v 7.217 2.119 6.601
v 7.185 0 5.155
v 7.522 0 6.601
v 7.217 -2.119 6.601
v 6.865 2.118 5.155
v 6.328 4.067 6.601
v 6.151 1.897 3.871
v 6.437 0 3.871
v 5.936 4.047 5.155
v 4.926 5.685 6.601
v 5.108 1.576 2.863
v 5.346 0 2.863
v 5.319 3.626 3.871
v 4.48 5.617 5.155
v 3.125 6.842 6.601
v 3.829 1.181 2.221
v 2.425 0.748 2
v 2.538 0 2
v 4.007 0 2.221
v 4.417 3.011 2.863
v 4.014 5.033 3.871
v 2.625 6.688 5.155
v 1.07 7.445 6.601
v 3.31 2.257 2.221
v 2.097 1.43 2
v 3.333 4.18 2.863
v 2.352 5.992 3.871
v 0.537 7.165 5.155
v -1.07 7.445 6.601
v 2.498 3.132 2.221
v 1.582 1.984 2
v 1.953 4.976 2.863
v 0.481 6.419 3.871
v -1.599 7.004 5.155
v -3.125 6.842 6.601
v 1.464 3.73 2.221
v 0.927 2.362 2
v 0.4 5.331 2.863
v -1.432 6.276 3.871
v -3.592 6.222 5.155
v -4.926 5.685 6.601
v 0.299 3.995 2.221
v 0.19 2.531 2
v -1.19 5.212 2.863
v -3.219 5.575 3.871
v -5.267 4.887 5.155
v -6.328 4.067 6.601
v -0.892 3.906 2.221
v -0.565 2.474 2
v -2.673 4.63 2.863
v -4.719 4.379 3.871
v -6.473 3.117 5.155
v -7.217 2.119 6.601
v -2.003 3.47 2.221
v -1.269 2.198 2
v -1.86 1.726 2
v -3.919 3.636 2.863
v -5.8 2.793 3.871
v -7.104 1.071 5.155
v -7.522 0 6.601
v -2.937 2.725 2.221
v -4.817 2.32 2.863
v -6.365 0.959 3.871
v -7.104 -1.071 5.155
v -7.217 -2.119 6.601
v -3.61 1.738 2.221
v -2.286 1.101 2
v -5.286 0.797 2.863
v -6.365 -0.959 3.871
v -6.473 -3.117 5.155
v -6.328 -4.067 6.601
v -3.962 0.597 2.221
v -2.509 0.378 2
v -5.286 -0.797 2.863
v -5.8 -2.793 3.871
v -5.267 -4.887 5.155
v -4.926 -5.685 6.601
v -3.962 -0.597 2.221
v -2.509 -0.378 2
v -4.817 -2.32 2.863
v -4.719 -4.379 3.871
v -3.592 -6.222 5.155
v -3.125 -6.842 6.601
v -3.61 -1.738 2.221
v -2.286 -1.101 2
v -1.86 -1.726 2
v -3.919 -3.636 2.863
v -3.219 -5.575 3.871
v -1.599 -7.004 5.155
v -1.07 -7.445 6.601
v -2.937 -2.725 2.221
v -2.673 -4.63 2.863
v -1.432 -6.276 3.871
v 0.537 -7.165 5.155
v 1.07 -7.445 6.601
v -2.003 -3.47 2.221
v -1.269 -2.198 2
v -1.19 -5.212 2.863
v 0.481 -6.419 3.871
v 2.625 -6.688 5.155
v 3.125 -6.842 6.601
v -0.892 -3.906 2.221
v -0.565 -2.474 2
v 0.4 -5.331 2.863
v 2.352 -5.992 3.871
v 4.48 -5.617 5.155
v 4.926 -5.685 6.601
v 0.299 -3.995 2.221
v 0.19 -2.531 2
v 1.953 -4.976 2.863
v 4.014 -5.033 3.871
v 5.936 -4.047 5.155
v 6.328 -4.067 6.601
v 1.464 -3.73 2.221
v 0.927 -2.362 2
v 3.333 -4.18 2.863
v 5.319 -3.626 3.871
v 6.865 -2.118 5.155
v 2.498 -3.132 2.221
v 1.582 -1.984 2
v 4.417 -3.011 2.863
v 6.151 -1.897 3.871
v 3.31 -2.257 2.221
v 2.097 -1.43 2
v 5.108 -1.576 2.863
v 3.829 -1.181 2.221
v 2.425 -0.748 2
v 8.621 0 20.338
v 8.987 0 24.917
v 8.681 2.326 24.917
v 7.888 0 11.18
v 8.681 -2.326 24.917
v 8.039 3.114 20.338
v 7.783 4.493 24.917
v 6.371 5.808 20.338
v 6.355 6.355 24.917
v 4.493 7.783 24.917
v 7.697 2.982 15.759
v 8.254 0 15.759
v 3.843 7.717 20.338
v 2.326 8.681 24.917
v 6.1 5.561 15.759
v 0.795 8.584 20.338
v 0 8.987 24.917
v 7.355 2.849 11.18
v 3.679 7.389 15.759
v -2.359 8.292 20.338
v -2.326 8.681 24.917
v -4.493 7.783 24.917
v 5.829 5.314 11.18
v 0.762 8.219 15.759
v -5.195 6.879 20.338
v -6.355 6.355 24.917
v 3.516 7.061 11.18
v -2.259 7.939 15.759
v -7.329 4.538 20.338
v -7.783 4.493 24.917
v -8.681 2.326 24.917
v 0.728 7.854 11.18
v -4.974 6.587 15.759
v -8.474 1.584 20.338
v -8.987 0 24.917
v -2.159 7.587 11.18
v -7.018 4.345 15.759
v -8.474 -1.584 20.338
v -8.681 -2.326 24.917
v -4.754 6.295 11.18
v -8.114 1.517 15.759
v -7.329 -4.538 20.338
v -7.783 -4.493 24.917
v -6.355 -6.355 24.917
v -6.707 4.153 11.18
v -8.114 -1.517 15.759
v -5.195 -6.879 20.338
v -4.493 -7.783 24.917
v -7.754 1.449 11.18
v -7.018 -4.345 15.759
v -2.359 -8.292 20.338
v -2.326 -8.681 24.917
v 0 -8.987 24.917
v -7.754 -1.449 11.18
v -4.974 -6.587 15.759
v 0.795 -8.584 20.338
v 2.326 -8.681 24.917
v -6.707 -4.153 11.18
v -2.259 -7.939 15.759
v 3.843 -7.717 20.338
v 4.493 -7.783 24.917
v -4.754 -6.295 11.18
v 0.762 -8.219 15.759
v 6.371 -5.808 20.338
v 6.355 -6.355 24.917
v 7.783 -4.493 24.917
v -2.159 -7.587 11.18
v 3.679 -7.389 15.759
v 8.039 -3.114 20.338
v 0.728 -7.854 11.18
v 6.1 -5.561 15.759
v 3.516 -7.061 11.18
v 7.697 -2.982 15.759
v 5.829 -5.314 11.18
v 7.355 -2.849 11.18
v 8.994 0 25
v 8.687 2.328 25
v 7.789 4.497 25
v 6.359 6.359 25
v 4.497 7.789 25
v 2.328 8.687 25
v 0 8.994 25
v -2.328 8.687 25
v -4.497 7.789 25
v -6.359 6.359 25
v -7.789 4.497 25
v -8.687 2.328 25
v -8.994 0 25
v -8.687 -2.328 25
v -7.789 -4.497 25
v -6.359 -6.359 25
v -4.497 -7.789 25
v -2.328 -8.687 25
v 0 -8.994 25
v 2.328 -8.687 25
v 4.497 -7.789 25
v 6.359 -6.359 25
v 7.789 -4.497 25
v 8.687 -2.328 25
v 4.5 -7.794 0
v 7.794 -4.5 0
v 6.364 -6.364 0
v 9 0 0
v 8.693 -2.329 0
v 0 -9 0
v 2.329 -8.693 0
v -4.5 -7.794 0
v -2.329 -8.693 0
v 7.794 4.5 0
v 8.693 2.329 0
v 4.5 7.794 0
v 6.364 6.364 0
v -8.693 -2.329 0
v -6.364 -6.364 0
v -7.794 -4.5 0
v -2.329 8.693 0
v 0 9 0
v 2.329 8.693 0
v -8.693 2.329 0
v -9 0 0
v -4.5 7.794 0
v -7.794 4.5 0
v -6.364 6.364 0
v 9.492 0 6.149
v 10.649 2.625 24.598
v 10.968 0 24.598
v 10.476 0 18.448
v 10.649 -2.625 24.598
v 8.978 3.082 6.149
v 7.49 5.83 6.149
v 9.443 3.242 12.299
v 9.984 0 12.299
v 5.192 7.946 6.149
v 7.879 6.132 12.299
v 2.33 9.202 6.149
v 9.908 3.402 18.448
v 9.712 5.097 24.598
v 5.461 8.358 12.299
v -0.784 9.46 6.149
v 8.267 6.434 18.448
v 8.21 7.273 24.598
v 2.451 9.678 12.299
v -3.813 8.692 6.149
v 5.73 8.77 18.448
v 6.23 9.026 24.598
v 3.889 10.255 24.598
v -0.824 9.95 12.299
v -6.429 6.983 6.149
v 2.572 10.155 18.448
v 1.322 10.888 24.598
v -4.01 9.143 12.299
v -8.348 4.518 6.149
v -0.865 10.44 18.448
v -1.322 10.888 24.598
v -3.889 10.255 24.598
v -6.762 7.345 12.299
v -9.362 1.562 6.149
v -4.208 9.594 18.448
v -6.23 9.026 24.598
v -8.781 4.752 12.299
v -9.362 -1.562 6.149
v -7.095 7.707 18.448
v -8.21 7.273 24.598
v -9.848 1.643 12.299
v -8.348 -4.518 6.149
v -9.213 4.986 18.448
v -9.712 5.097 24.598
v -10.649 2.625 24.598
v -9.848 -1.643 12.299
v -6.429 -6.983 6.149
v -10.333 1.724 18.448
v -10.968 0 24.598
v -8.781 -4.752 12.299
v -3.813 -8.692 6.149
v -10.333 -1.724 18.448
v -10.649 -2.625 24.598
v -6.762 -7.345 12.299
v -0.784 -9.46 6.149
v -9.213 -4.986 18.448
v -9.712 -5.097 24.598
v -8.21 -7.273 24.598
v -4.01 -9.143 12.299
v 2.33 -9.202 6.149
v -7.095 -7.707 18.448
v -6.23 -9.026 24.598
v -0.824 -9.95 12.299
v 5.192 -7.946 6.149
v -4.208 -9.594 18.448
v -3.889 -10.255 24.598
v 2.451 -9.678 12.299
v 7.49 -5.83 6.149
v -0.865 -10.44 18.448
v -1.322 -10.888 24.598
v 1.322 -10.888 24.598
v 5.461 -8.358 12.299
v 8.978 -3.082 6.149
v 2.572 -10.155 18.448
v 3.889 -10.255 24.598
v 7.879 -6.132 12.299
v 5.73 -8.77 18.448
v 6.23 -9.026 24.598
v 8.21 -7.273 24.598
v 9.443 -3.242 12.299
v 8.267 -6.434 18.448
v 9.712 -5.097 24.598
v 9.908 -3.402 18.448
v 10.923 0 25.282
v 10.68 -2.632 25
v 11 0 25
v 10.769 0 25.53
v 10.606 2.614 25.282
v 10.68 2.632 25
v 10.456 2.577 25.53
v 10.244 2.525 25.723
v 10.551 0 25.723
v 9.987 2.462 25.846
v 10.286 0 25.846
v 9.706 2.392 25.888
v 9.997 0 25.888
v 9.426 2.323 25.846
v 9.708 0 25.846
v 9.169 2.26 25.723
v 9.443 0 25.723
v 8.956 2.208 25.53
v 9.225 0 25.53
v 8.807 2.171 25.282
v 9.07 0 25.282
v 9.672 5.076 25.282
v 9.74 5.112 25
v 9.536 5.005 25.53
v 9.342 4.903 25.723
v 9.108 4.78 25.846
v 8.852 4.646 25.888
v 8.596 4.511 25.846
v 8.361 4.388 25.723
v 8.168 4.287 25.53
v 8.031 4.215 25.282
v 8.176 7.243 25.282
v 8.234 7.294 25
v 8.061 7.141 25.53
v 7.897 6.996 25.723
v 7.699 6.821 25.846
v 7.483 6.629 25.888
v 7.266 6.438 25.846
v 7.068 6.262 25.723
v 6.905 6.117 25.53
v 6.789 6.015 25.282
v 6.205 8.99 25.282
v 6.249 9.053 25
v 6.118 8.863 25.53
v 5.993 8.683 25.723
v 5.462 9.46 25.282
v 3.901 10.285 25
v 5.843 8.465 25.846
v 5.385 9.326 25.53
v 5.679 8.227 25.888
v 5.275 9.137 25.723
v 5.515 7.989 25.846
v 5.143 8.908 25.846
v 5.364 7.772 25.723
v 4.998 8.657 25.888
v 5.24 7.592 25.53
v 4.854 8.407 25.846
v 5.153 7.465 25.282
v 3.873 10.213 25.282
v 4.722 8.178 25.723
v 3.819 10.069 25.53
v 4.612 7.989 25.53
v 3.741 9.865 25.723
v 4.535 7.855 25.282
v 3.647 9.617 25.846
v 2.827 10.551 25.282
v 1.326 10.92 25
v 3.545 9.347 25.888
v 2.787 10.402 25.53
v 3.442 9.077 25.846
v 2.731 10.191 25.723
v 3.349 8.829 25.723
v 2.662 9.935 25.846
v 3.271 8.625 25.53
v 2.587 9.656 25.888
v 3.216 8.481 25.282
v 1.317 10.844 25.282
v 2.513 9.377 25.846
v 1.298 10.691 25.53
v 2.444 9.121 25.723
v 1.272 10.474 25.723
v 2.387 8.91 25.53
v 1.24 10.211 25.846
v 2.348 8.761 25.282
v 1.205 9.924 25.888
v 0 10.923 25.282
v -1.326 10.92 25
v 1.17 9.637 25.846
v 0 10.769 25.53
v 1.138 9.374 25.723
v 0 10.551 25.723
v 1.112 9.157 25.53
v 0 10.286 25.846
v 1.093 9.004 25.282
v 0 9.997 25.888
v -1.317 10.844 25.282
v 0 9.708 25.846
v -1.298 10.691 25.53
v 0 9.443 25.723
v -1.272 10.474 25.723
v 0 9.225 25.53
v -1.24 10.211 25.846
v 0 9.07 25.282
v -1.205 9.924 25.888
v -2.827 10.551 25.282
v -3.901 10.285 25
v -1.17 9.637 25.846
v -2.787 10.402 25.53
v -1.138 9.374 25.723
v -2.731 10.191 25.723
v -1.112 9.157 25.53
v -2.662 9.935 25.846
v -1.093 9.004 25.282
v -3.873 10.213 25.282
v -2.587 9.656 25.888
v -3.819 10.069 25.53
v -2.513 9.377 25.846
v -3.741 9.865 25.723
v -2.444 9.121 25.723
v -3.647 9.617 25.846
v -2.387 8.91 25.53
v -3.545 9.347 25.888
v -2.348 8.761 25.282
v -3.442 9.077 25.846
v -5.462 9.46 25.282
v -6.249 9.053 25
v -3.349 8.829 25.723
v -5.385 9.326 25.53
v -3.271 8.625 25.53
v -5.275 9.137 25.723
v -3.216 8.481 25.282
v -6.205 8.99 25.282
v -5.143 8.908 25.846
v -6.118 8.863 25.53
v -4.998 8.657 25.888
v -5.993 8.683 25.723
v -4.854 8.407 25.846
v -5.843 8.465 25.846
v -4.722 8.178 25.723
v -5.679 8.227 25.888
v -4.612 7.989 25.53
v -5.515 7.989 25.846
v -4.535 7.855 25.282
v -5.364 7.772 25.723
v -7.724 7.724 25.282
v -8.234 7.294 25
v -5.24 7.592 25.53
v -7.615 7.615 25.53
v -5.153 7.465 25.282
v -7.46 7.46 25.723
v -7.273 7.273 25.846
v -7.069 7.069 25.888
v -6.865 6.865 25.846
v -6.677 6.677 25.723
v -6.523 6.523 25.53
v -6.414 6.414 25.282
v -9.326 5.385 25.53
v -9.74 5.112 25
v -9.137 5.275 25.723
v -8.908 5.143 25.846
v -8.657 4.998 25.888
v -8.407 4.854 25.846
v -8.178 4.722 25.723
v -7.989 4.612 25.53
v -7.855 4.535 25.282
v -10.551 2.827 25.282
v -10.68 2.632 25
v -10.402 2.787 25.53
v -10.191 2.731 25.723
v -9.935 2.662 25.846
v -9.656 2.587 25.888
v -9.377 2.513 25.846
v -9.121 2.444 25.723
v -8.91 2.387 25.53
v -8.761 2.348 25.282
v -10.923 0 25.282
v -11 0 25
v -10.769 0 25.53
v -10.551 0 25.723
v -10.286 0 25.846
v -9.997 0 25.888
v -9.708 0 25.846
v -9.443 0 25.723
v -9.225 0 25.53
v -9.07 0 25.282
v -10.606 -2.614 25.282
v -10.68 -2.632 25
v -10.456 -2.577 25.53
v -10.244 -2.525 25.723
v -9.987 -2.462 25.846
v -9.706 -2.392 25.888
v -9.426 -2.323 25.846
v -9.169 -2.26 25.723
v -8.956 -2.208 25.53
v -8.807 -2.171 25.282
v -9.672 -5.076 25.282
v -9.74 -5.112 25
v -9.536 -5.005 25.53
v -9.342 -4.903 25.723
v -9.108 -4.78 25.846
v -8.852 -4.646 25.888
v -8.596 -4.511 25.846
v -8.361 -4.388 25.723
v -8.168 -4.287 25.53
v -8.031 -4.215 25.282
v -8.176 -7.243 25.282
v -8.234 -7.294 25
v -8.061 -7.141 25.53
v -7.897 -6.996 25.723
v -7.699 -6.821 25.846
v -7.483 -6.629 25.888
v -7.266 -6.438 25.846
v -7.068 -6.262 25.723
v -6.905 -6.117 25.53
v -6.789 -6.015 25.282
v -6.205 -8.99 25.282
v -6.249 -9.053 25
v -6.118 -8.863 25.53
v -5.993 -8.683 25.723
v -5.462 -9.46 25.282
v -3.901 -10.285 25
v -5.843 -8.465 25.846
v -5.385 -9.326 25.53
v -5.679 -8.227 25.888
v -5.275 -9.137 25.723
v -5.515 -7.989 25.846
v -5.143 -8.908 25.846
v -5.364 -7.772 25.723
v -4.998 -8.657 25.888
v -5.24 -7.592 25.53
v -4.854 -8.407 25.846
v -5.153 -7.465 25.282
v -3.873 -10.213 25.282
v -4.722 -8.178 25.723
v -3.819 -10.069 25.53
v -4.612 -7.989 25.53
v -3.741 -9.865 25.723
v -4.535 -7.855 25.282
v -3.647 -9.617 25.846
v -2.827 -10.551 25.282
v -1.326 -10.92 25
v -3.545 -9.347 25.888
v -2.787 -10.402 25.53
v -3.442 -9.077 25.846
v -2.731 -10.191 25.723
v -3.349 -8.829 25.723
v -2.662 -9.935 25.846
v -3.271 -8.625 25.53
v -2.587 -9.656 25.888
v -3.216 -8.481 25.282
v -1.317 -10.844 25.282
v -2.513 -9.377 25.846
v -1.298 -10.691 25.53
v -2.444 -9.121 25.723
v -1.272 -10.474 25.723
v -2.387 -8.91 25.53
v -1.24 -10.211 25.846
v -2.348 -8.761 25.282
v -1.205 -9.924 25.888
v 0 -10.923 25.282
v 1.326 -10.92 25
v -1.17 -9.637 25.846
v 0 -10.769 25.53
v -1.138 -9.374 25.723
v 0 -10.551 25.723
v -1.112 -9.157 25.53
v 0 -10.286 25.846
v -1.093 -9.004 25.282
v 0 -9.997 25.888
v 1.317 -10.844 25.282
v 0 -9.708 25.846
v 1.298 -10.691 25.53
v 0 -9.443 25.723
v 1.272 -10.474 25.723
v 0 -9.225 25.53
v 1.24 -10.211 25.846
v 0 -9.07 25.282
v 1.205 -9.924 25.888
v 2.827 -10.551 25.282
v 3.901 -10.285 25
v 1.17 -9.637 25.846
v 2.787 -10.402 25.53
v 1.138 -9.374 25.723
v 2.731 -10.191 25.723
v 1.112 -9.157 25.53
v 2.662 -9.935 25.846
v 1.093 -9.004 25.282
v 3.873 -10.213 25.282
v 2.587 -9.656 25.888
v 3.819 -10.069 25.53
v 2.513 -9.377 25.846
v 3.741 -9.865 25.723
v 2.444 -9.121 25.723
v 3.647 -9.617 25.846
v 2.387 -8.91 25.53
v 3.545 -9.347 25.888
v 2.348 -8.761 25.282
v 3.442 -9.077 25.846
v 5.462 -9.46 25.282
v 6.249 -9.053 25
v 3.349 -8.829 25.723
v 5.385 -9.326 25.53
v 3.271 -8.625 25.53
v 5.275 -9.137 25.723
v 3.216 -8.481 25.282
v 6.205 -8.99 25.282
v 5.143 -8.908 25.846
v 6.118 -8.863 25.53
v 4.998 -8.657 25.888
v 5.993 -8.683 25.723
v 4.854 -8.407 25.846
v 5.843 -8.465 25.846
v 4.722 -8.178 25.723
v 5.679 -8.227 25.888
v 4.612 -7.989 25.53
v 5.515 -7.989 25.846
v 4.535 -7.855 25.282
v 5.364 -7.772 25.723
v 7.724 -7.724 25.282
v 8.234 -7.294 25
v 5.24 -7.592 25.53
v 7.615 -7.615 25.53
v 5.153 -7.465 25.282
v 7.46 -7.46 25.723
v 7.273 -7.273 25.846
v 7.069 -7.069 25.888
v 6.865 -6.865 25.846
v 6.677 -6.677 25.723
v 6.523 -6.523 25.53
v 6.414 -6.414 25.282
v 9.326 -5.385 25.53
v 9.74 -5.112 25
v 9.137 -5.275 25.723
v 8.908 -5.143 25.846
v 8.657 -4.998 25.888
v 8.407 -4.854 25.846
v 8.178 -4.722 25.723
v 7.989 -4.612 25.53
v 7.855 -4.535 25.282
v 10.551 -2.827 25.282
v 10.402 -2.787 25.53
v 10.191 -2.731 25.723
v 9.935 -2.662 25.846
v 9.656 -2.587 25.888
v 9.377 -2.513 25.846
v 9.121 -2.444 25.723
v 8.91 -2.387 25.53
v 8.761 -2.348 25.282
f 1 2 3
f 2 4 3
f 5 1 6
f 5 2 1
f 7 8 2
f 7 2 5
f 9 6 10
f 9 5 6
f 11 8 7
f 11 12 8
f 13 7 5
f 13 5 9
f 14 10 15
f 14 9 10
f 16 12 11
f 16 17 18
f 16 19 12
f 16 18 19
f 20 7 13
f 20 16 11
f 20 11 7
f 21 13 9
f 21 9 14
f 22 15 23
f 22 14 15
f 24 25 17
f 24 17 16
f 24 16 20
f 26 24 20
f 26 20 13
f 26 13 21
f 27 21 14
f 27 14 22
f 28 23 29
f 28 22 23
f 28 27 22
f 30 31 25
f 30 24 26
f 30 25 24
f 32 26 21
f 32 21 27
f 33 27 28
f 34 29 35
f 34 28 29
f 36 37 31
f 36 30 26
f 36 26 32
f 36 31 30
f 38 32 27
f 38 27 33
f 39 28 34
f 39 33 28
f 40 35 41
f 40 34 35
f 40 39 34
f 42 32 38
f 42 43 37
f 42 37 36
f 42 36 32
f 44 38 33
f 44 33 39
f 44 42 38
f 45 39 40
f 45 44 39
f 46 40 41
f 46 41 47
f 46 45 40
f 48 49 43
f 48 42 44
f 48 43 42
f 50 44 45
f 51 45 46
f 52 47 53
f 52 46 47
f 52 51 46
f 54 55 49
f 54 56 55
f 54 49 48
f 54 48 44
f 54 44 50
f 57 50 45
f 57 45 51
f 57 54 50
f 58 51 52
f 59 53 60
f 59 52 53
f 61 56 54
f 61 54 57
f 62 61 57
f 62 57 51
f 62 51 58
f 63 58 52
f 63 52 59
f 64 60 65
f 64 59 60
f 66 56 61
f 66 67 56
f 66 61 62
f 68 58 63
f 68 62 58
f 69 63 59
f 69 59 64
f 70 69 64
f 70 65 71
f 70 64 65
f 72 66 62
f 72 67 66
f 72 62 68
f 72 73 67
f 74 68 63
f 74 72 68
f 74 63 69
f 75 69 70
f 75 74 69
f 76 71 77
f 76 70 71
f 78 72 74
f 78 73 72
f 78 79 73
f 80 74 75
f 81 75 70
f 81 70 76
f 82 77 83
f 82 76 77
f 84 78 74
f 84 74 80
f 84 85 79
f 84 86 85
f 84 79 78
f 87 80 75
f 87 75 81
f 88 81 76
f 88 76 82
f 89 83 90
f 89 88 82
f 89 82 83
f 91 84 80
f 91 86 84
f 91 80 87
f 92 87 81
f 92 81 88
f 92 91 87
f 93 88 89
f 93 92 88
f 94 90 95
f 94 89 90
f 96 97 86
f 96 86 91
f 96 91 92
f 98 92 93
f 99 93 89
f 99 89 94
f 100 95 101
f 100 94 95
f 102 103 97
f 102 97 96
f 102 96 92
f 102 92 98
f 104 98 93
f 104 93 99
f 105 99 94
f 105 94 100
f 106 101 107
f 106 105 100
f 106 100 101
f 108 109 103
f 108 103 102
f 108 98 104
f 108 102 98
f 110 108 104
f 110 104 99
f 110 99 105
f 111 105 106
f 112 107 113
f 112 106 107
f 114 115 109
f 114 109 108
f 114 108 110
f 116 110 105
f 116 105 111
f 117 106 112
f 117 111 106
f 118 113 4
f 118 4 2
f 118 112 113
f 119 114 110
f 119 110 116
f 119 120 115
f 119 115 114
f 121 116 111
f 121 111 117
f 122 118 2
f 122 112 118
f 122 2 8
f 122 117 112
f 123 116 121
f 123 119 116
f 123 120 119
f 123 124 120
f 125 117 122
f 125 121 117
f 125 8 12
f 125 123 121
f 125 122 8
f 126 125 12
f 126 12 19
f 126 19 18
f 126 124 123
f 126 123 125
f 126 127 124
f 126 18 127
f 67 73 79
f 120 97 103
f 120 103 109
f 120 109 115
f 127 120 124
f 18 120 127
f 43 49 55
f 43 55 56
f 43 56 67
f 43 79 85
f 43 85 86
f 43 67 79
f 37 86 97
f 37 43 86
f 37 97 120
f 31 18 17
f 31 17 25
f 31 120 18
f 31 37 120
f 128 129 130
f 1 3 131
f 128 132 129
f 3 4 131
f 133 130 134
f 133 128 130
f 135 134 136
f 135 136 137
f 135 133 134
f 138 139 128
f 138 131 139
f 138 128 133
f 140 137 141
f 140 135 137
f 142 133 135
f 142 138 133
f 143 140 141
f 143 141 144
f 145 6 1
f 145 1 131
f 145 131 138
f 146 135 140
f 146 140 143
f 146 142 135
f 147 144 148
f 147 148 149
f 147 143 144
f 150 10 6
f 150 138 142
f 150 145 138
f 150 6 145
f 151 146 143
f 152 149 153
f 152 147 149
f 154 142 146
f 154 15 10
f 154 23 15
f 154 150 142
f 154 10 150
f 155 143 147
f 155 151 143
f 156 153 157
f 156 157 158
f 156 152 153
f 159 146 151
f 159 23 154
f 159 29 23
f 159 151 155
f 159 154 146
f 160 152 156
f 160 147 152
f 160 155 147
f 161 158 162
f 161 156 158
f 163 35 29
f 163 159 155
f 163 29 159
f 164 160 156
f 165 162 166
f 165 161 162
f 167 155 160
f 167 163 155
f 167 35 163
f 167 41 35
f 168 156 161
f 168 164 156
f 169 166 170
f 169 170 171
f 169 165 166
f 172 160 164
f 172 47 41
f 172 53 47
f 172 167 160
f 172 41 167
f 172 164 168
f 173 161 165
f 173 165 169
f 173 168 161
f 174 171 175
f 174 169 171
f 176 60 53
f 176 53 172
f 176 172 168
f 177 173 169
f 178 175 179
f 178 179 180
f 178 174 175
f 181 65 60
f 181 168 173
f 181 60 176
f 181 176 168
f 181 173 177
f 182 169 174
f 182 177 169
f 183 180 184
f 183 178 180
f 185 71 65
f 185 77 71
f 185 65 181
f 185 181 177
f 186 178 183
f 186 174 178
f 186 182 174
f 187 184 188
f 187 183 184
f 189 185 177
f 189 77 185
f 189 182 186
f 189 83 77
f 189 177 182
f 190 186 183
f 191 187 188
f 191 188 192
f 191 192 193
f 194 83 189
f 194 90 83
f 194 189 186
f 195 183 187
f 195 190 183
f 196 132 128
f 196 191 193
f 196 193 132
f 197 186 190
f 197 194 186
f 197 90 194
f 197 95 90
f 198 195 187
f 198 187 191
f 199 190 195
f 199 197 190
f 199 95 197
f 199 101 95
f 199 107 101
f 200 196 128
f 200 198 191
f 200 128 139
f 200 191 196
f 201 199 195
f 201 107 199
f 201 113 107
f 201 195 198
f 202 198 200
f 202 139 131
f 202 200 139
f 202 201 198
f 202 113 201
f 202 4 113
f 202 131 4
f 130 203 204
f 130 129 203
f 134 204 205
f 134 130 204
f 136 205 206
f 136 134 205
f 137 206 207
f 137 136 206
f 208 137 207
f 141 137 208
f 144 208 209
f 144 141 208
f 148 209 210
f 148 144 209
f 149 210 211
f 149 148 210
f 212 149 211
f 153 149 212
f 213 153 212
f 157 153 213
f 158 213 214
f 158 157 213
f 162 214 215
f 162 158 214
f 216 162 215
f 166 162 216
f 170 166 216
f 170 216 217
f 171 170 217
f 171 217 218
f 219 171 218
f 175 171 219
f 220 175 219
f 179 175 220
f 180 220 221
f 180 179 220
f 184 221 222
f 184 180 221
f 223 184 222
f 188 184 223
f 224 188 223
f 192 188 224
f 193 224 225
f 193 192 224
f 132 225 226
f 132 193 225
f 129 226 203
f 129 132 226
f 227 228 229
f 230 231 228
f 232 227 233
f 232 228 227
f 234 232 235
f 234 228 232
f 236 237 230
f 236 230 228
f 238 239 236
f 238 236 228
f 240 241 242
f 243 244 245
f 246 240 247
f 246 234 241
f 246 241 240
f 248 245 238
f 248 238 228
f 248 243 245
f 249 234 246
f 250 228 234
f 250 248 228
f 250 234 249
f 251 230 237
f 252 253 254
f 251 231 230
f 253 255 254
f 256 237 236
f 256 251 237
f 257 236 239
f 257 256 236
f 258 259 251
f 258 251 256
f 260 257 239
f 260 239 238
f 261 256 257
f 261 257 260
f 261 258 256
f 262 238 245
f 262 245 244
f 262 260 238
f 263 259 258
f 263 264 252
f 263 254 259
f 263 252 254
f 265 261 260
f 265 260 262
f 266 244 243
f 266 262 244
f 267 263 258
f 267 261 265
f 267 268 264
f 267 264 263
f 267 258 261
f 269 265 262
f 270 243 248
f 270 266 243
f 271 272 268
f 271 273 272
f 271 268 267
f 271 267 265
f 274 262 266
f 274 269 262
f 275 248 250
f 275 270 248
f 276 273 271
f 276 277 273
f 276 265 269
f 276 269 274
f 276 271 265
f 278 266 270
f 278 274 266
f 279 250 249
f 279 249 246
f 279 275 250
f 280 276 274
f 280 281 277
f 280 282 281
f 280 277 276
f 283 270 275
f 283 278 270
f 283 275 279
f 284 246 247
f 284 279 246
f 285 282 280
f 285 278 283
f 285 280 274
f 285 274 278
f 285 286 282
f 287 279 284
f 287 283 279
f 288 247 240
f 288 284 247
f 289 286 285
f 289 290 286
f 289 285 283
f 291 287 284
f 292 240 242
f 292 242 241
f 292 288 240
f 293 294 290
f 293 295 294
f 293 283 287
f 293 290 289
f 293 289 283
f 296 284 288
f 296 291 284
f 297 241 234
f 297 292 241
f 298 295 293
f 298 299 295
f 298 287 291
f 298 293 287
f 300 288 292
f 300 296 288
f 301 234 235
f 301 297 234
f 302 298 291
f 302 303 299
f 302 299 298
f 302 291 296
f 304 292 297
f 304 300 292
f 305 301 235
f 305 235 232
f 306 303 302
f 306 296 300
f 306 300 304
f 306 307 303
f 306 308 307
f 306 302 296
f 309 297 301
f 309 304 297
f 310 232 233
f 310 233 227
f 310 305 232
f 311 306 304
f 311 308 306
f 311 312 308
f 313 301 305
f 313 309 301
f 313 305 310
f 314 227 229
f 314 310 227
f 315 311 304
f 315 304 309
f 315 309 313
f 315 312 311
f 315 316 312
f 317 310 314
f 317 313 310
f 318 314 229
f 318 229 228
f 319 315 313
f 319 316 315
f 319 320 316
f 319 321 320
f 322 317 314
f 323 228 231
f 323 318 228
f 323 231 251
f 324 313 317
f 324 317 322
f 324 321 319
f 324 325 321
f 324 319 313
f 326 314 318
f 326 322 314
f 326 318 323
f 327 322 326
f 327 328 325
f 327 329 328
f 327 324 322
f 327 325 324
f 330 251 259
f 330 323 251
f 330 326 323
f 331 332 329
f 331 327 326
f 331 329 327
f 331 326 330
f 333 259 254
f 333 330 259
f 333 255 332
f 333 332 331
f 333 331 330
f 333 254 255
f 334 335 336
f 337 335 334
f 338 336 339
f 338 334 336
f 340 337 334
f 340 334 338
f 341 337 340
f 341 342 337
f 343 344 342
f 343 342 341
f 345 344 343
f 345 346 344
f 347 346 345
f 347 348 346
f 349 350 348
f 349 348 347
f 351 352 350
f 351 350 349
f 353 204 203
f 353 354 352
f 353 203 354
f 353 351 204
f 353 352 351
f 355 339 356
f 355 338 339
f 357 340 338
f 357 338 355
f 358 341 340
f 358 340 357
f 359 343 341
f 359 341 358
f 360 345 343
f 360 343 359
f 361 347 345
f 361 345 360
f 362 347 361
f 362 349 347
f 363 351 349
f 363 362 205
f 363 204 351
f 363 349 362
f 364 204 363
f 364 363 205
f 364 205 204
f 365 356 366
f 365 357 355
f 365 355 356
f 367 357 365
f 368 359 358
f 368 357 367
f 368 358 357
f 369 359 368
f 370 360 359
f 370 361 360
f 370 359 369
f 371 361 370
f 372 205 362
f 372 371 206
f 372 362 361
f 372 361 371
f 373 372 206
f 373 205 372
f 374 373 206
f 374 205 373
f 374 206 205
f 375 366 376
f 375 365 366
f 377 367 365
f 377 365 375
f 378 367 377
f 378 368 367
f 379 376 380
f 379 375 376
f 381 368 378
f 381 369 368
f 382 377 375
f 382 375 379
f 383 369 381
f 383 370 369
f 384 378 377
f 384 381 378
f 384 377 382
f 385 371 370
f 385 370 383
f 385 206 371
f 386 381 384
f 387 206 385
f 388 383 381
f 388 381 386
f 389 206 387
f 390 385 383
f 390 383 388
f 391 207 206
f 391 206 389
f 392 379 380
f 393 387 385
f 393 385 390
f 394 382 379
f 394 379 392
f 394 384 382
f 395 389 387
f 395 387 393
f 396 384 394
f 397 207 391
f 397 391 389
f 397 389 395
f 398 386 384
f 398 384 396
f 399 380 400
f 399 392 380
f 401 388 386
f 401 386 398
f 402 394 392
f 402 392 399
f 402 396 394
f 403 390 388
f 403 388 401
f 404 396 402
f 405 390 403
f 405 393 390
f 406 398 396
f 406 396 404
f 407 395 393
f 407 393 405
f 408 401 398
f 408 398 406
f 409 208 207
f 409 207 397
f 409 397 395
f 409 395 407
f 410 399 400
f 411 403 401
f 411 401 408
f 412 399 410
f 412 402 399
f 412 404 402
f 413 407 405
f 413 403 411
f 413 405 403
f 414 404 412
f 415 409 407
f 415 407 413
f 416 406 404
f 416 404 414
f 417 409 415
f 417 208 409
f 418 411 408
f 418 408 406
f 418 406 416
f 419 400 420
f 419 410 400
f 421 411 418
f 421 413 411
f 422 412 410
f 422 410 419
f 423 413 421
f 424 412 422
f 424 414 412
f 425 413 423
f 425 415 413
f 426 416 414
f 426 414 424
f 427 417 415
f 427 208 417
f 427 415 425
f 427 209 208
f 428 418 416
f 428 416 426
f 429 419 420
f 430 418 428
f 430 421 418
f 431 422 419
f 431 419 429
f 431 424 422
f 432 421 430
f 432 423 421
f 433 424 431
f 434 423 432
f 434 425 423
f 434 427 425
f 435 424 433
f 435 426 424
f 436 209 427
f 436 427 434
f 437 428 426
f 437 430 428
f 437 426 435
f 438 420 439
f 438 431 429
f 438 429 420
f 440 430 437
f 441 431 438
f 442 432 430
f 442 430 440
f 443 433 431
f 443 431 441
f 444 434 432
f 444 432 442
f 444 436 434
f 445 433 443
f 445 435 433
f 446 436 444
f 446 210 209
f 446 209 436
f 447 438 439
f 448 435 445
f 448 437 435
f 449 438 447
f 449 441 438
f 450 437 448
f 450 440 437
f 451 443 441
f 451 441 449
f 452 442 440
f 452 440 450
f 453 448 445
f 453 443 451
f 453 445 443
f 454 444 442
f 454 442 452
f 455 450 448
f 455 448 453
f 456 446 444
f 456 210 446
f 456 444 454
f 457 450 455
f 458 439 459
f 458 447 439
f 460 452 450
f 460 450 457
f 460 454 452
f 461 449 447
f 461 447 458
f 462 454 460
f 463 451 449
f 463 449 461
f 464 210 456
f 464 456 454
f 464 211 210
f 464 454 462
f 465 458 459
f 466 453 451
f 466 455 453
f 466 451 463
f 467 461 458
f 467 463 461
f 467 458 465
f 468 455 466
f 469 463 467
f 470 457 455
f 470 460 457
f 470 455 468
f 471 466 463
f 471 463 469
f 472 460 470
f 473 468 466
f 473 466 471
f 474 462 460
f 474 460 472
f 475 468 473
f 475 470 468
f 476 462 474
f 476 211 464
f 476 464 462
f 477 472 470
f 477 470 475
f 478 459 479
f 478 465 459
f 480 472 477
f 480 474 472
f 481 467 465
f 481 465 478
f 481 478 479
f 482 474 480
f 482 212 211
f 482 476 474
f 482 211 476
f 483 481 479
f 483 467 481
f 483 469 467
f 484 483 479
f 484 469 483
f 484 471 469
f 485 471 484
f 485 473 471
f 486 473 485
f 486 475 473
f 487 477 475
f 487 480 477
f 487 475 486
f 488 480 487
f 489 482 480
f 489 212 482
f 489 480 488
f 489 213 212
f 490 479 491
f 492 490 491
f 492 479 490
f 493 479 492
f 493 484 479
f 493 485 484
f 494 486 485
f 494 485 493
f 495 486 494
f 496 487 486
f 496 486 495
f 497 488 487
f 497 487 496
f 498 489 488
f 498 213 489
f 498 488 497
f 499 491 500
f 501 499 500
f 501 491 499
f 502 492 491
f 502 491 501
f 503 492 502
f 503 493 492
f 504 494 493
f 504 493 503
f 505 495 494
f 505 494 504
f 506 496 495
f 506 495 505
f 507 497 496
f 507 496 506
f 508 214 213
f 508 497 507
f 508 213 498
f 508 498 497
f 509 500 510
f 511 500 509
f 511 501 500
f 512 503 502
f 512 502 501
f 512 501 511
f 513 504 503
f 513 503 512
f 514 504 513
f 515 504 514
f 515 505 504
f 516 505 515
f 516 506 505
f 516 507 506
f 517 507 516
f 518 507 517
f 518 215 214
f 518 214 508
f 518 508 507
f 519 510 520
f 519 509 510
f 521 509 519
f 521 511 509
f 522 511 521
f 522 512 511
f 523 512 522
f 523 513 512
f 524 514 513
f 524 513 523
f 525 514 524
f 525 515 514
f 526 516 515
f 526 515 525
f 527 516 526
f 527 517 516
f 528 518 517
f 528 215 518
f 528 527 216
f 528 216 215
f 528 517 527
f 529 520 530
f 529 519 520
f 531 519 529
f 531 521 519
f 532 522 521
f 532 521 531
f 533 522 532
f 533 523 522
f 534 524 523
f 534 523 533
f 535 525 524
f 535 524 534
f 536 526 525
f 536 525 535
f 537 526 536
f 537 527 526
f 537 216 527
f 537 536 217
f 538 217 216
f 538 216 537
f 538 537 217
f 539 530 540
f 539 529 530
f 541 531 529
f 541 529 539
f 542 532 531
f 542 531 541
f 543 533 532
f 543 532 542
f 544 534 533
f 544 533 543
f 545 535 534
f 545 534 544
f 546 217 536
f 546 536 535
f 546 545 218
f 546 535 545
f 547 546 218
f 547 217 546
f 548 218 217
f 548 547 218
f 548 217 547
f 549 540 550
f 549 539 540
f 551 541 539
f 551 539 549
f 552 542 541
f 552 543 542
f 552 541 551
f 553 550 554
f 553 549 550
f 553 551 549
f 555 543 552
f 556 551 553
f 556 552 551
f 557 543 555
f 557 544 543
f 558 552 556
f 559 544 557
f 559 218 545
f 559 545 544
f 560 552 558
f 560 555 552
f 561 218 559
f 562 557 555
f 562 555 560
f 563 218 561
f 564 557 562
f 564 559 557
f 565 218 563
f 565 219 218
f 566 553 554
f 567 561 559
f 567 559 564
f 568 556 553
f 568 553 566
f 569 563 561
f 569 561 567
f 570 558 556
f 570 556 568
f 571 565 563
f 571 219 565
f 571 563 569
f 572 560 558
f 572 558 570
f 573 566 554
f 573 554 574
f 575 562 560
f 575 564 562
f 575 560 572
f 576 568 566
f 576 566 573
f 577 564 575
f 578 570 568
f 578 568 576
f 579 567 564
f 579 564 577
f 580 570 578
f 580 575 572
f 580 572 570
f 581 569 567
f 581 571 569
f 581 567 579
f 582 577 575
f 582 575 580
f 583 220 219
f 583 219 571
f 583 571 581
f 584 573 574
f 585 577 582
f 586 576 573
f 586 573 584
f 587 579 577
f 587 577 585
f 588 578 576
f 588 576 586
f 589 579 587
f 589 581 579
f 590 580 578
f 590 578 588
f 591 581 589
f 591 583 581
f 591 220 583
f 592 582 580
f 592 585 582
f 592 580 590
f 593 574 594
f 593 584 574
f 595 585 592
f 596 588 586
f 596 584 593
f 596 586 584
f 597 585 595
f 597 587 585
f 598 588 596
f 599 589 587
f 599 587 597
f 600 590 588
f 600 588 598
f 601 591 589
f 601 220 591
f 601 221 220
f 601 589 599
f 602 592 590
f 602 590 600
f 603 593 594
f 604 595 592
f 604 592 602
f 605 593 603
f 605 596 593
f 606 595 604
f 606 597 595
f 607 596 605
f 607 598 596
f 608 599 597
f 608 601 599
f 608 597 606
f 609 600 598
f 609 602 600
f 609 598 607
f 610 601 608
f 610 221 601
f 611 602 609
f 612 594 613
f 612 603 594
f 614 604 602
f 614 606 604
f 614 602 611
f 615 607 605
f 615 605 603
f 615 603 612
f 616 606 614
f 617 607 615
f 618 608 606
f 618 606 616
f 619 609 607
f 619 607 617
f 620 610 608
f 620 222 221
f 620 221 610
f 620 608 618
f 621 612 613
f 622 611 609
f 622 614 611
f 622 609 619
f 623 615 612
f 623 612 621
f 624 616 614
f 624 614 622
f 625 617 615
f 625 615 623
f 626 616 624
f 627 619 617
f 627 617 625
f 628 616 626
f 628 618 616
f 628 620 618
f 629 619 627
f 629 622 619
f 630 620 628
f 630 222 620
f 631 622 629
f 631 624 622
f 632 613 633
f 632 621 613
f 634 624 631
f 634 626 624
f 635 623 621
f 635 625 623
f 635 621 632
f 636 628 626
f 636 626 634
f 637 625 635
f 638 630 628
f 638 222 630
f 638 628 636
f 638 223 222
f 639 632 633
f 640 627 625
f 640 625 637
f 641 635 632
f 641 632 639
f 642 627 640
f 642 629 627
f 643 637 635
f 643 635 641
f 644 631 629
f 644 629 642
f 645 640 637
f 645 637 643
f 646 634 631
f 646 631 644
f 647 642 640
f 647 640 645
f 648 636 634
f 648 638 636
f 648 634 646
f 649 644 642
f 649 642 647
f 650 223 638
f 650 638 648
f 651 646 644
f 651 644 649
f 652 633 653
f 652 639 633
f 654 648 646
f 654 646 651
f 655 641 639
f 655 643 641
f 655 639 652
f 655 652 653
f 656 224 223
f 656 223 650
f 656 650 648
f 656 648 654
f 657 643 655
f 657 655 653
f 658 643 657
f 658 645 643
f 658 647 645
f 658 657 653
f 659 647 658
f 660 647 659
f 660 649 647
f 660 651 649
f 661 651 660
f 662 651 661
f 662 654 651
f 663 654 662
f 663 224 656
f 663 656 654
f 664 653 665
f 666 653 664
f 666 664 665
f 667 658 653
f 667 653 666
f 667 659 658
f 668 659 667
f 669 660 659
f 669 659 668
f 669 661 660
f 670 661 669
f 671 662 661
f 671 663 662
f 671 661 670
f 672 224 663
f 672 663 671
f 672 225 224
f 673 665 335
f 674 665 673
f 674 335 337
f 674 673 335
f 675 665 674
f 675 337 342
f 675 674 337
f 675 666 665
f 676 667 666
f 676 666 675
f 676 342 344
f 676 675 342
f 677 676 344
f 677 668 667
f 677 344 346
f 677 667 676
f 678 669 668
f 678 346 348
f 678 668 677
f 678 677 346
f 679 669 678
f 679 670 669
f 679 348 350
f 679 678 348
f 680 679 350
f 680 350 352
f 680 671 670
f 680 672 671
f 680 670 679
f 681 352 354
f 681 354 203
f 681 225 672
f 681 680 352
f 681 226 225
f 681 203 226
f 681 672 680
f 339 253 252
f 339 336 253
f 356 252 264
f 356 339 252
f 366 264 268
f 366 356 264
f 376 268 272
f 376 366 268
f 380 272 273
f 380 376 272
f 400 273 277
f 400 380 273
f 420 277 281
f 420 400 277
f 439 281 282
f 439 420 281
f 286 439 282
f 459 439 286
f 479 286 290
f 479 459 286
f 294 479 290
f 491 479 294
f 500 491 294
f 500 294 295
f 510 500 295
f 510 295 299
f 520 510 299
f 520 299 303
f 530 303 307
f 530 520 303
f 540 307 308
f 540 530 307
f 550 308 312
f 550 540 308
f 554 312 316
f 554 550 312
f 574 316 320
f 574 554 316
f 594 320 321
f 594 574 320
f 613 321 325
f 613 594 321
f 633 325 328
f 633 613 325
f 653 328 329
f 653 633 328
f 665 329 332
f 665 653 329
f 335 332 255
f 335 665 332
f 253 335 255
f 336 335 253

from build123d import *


with BuildPart() as f1:
    # F0 (on Front) → F1 (revolve)
    with BuildSketch(Plane.XZ):
        with BuildLine():
            Line((0, 2), (0, 0))
            Line((0, 0), (9, 0))
            Line((9, 0), (10.9678164715, 24.5977058939))
            Line((10.9678164715, 24.5977058939), (11, 25))
            Line((11, 25), (8.9936102074, 25))
            Line((8.9936102074, 25), (8.98694515, 24.9166867831))
            Line((8.98694515, 24.9166867831), (7.5217121184, 6.6012738886))
            ThreePointArc((7.5217121184, 6.6012738886), (5.9292702464, 3.3261987971), (2.5376357258, 2))
            Line((2.5376357258, 2), (0, 2))
        make_face()
        with BuildLine():
            Line((8.9936102074, 25), (11, 25))
            ThreePointArc((11, 25), (9.9968051037, 25.8884287672), (8.9936102074, 25))
        make_face()
    revolve(axis=Axis((0, 0, 12.5), (0, 0, 1)))


solid = f1.part
